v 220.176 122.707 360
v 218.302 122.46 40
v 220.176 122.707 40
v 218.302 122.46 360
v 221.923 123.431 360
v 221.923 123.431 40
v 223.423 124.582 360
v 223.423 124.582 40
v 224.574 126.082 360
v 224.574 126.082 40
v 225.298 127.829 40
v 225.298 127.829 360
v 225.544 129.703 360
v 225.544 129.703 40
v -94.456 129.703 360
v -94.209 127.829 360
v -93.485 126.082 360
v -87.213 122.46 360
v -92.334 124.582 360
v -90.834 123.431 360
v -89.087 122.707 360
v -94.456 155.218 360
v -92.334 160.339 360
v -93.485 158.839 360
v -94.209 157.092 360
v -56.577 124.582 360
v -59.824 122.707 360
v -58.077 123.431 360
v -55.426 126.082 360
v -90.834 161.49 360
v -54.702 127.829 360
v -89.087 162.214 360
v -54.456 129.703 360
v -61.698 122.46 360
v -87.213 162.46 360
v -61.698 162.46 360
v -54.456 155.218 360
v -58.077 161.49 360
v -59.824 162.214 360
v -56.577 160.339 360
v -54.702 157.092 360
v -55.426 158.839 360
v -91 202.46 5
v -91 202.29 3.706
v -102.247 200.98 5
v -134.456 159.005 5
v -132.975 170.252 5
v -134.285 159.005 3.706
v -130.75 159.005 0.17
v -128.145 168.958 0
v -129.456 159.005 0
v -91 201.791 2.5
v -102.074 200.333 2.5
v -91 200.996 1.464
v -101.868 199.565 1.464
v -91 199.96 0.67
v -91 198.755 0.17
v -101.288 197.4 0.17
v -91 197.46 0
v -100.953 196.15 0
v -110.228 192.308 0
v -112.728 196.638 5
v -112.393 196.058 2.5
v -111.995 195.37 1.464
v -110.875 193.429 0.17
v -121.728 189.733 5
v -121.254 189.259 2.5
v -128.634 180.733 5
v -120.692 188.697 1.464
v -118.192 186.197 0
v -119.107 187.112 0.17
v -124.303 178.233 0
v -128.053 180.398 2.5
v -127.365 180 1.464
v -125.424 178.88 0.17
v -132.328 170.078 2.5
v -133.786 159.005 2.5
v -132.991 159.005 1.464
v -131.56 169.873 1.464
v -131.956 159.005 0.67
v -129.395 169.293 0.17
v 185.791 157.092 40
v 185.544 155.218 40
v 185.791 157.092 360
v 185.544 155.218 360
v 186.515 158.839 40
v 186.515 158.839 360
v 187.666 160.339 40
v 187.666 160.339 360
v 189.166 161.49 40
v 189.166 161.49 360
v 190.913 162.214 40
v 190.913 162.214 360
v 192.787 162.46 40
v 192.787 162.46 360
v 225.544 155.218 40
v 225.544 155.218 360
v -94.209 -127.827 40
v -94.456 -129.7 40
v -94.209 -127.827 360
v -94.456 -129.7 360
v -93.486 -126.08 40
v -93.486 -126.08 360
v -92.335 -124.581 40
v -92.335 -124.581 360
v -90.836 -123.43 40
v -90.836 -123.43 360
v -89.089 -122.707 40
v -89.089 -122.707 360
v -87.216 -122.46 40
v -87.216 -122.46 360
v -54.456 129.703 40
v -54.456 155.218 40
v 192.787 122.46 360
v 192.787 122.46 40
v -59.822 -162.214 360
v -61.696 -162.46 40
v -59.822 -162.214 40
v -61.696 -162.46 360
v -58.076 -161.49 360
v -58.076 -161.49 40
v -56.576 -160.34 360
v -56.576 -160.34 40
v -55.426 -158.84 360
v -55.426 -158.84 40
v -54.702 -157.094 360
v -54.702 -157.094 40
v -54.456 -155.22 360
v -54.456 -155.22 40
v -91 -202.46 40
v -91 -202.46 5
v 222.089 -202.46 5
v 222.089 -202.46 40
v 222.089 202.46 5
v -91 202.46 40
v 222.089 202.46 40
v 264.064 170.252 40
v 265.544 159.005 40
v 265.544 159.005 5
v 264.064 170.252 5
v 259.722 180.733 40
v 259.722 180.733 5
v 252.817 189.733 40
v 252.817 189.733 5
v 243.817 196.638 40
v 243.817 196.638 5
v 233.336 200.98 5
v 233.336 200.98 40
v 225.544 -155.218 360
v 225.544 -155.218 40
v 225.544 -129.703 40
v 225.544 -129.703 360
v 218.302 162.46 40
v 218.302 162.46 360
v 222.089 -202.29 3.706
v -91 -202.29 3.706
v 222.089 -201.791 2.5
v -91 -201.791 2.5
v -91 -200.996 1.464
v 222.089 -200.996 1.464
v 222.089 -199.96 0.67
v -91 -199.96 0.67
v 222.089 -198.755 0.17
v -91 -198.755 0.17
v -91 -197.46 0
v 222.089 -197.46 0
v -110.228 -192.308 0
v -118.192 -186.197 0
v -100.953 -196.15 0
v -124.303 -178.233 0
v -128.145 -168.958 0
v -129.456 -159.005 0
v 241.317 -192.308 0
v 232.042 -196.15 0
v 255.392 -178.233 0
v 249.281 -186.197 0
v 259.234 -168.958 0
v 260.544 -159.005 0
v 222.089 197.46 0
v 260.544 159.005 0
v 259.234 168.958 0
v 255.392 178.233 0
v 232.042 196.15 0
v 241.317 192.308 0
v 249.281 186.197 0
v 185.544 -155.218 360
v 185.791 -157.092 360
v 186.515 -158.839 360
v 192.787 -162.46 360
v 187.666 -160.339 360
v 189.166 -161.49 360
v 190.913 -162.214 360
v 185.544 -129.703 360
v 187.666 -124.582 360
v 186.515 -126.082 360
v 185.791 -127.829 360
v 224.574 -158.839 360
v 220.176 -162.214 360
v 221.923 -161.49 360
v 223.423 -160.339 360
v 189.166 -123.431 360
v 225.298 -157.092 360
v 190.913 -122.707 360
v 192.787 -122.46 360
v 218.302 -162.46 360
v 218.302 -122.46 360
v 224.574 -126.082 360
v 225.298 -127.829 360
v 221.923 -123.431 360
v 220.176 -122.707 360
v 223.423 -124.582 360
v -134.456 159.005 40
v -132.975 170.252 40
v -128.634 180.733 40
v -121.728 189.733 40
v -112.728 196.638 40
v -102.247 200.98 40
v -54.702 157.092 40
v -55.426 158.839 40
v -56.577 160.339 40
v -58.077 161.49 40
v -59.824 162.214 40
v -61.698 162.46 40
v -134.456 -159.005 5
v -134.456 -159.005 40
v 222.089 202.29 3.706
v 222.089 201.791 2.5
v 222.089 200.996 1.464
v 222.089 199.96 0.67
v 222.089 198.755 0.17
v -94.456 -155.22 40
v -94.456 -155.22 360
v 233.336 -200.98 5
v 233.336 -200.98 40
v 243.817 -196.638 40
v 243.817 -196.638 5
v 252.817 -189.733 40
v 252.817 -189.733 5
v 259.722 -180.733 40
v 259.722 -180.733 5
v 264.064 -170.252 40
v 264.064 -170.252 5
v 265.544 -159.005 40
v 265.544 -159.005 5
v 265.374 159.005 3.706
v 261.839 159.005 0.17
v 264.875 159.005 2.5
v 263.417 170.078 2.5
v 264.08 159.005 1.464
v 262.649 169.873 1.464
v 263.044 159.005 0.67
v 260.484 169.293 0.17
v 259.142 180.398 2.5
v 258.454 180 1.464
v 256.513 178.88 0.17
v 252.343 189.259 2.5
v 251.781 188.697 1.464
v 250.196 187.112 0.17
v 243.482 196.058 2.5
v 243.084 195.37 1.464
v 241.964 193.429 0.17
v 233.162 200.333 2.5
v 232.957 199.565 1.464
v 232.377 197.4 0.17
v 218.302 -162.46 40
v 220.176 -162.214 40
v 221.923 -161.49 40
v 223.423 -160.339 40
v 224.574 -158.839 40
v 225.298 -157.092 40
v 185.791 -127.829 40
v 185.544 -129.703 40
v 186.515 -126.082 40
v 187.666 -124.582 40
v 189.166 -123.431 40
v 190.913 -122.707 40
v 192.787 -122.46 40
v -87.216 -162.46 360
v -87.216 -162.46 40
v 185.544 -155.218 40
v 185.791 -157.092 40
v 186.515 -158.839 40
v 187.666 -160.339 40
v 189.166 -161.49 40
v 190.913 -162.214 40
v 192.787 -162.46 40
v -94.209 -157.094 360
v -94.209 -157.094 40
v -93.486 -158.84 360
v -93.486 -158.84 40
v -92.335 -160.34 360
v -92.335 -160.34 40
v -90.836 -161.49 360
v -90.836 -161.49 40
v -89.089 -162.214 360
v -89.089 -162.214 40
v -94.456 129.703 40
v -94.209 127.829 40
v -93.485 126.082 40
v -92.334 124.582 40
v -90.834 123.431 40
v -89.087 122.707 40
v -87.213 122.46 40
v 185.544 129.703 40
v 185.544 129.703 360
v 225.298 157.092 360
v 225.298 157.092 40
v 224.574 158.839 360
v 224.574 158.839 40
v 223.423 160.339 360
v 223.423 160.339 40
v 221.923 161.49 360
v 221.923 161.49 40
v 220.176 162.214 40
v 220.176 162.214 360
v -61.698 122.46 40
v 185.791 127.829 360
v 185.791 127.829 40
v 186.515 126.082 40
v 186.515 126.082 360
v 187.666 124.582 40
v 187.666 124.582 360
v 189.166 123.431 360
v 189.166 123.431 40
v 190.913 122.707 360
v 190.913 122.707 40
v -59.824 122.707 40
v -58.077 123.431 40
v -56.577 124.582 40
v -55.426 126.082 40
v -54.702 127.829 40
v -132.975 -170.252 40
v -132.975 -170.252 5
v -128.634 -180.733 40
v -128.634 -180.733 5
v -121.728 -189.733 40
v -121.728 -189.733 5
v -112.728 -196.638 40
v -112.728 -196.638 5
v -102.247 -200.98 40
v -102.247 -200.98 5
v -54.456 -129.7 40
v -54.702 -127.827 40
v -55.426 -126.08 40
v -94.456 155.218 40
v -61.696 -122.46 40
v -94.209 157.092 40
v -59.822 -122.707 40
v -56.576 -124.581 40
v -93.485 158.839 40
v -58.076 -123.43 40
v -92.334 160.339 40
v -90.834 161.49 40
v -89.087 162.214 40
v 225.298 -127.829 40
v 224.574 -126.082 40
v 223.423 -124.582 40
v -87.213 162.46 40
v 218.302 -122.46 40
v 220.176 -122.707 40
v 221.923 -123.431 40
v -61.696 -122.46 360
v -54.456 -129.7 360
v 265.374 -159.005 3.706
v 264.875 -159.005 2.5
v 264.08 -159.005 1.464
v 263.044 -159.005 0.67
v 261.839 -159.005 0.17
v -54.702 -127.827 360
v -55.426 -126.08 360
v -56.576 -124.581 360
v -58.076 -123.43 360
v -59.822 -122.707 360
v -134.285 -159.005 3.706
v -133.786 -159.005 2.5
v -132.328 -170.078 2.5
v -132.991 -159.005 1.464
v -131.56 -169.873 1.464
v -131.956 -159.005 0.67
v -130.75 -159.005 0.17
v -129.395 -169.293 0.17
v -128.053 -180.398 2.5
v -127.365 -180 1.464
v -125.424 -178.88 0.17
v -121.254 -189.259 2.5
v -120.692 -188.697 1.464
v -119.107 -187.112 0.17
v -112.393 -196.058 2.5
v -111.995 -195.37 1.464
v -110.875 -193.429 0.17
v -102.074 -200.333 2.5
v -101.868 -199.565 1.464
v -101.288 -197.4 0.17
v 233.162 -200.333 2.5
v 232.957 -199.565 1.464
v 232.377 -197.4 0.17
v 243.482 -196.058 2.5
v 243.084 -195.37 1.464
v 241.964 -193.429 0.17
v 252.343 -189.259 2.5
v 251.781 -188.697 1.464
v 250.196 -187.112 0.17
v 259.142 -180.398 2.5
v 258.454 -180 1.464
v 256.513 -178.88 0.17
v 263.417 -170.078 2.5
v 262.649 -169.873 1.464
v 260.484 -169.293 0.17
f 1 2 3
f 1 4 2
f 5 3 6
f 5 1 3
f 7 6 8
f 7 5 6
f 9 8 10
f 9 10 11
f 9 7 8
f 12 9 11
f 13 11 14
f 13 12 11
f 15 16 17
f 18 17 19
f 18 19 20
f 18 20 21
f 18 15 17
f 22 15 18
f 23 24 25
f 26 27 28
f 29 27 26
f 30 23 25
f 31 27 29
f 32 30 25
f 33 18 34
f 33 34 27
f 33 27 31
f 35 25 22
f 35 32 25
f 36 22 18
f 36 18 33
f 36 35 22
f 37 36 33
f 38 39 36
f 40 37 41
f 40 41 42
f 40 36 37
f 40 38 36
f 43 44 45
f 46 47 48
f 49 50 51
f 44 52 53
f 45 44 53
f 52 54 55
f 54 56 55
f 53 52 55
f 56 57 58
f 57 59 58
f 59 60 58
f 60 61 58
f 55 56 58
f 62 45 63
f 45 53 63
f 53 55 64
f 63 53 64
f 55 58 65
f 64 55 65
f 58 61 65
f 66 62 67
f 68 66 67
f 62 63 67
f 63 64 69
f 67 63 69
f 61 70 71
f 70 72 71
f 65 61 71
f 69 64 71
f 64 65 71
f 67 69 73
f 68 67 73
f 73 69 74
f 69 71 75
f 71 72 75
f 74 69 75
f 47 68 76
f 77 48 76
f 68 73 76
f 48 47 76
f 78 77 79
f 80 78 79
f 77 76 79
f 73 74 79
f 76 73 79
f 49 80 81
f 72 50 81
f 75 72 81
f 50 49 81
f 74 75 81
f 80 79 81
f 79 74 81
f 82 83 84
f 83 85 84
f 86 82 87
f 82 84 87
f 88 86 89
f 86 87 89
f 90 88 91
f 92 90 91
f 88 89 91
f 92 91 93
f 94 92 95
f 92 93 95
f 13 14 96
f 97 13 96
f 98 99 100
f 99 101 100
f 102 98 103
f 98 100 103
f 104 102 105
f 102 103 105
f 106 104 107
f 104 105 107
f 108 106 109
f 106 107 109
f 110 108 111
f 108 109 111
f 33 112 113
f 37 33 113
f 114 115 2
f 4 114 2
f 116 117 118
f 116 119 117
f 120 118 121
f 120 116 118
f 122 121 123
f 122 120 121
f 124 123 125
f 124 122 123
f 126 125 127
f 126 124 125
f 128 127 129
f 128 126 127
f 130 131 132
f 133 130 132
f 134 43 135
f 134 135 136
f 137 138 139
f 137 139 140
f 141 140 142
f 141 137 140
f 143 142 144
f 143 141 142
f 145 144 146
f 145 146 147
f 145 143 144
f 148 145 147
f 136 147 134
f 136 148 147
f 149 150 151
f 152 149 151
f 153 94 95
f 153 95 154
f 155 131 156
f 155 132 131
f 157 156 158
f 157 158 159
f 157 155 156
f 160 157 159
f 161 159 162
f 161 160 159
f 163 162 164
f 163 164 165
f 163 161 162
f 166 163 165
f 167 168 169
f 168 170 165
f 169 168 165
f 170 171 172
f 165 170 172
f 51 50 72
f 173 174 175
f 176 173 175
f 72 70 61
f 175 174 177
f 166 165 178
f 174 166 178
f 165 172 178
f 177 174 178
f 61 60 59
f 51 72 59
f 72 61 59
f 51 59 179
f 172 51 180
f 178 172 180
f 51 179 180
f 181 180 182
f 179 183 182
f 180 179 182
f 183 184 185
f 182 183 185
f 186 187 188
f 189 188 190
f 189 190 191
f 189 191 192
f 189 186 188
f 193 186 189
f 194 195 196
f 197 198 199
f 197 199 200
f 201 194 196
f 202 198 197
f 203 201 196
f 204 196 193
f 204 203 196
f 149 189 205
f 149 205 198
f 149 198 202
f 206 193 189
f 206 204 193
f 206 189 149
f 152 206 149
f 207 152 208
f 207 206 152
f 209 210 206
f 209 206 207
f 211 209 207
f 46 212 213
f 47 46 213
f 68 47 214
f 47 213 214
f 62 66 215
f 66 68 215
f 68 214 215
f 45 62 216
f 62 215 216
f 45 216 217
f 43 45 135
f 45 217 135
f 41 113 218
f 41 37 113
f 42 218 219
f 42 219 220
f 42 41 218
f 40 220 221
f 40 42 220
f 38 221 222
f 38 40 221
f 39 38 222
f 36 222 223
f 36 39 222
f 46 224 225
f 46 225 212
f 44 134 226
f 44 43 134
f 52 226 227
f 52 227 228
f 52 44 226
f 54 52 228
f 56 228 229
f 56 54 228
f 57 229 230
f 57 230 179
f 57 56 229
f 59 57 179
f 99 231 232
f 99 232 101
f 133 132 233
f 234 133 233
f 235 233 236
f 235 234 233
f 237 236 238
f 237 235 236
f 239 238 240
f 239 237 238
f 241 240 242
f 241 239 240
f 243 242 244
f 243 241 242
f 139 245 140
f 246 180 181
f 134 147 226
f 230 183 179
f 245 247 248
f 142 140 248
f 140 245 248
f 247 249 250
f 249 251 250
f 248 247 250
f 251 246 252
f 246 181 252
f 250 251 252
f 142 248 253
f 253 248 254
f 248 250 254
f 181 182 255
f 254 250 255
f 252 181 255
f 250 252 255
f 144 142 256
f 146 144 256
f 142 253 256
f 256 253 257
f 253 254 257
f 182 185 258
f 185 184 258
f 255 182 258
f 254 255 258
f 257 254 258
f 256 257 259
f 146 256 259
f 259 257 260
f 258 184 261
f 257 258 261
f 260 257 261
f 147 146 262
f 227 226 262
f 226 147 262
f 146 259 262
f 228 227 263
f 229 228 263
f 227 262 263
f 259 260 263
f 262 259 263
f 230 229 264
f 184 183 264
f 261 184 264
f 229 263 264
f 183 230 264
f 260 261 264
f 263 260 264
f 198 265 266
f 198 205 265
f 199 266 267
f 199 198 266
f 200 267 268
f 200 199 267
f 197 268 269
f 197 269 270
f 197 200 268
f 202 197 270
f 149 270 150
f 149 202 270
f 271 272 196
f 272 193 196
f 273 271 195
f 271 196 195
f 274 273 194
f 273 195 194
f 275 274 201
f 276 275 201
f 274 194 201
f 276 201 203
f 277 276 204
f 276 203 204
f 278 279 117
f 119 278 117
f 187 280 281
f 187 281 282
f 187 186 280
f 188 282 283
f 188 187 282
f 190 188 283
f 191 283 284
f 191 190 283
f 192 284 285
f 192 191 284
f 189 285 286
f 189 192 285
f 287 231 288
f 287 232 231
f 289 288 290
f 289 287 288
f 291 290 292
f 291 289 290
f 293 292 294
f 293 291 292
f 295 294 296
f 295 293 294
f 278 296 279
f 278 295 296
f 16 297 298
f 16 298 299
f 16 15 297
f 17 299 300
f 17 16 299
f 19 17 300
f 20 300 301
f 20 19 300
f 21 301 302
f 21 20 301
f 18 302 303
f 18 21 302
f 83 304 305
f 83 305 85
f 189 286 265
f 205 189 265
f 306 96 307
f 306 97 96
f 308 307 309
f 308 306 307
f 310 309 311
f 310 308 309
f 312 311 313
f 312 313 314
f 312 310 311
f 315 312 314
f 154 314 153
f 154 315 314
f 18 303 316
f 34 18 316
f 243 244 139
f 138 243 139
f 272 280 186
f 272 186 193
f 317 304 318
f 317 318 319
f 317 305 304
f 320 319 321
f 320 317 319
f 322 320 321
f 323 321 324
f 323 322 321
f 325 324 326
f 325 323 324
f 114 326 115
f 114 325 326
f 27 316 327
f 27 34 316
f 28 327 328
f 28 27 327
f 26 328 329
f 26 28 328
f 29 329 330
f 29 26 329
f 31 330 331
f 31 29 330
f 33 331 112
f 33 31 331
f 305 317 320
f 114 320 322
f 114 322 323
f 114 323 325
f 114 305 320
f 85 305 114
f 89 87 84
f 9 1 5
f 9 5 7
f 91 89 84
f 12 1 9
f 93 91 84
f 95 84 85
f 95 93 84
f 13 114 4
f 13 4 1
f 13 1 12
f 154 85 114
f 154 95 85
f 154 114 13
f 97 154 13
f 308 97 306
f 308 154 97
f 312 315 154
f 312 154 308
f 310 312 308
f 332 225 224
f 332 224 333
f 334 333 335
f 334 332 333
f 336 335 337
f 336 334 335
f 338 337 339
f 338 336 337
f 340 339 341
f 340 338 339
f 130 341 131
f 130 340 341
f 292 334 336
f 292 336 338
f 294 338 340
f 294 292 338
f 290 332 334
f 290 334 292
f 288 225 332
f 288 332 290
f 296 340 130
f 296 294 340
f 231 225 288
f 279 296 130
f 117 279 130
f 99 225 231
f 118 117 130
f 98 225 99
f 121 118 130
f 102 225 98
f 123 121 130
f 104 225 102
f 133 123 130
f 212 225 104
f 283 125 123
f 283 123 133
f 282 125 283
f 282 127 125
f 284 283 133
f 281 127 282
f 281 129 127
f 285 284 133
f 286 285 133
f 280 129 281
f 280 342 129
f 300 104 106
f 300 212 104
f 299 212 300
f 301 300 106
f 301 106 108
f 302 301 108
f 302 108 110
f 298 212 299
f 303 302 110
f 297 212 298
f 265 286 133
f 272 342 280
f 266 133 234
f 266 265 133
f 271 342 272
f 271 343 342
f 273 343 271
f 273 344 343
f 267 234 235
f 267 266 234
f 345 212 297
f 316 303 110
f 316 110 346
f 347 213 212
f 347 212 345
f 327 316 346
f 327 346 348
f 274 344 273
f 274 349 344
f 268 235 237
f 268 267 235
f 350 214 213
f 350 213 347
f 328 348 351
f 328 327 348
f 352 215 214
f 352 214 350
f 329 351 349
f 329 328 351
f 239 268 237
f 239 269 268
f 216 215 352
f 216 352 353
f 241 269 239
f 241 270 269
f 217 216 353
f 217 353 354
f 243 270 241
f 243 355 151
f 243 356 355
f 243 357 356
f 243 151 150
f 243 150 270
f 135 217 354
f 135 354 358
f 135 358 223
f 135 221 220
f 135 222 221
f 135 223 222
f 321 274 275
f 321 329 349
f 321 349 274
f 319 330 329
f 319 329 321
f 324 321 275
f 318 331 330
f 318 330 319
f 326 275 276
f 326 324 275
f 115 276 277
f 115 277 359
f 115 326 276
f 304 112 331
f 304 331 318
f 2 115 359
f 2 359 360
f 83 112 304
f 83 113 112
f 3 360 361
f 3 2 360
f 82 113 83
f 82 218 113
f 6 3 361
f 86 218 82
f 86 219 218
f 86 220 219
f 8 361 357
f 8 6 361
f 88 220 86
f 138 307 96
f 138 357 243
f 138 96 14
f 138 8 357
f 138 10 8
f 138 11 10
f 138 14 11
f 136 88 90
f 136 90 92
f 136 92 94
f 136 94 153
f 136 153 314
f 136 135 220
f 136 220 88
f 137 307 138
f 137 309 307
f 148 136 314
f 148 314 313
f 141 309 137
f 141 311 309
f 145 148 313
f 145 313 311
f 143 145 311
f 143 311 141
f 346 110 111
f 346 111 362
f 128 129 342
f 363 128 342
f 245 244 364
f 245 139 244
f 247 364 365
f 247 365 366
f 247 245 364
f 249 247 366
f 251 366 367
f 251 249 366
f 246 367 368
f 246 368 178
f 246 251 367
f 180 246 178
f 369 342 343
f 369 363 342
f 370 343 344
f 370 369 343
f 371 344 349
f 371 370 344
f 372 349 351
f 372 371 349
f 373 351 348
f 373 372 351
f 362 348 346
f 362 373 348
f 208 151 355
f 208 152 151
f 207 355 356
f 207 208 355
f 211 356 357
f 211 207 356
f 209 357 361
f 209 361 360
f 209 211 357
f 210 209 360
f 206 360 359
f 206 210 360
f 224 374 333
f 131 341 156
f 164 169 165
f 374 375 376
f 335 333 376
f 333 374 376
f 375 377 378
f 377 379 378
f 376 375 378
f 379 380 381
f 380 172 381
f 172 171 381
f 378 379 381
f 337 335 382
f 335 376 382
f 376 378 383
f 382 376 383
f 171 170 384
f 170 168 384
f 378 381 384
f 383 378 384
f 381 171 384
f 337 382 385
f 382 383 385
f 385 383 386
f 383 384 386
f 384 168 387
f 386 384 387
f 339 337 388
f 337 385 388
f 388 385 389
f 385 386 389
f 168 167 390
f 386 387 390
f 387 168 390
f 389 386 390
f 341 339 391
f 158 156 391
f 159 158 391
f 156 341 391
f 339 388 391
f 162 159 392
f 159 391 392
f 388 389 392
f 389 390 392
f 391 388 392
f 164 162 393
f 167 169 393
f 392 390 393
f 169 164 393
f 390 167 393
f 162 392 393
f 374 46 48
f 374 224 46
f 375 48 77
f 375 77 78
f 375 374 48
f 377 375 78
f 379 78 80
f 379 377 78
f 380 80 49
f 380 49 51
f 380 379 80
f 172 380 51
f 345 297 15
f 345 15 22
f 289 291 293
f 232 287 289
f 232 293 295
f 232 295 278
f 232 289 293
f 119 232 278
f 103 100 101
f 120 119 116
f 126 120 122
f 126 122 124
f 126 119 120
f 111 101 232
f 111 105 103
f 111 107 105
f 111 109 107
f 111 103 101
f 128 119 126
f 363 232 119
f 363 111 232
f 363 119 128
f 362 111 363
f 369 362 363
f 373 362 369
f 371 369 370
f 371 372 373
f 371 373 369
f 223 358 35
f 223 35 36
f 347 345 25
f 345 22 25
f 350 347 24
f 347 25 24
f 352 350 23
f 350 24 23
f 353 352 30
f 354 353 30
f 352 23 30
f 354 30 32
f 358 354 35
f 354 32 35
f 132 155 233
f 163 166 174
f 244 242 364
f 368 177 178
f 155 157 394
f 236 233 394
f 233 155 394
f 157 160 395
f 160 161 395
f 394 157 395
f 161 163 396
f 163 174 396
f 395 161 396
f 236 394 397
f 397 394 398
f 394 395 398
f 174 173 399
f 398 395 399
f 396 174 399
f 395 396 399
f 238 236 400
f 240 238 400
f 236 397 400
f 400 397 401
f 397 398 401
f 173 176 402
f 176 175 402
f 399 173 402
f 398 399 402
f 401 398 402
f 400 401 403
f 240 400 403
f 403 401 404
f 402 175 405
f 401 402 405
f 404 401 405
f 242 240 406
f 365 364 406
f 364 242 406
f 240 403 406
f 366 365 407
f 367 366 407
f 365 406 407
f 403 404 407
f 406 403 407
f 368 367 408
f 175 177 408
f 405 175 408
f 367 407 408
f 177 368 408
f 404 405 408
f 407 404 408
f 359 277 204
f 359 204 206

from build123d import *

# Parameters (mm, degrees)
F0_W     = 400
F0_H     = 404.9209267448
F1_DEPTH = 40
F2_R     = 43.4558441227
F3_W     = 40
F3_H     = 40
F4_DEPTH = 360
F5_R     = 7.24
F6_W     = 40
F6_H     = 40
F7_DEPTH = 360
F8_R     = 7.2426406871
F9_R     = 5


with BuildPart() as f1:
    # F0 (on Top) → F1 (new body)
    with BuildSketch(Plane.XY):
        with Locations((65.5444227159, 0)):
            Rectangle(F0_W, F0_H)
    extrude(amount=F1_DEPTH)

    # F2
    f2_edges = [f1.edges().sort_by_distance(p)[0] for p in [
        (-134.455577, -202.460463, 20),
        (-134.455577, 202.460463, 20),
        (265.544423, 202.460463, 20),
        (265.544423, -202.460463, 20),
    ]]
    fillet(f2_edges, radius=F2_R)

    # F3 (on Top) → F4 (join)
    with BuildSketch(Plane.XY):
        with Locations((-74.4555772841, -142.4604633724)):
            Rectangle(F3_W, F3_H)
    extrude(amount=F4_DEPTH)

    # F5
    f5_edges = [f1.edges().sort_by_distance(p)[0] for p in [
        (-54.455577, -162.460463, 200),
        (-54.455577, -122.460463, 200),
        (-94.455577, -122.460463, 200),
        (-94.455577, -162.460463, 200),
    ]]
    fillet(f5_edges, radius=F5_R)

    # F6 (on Top) → F7 (join)
    with BuildSketch(Plane.XY):
        with Locations((205.5444227159, -142.4604633724)):
            Rectangle(F6_W, F6_H)
        with Locations((205.5444227159, 142.4604633724)):
            Rectangle(F6_W, F6_H)
        with Locations((-74.4555772841, 142.4604633724)):
            Rectangle(F6_W, F6_H)
    extrude(amount=F7_DEPTH)

    # F8
    f8_edges = [f1.edges().sort_by_distance(p)[0] for p in [
        (-54.455577, 162.460463, 200),
        (-94.455577, 162.460463, 200),
        (-94.455577, 122.460463, 200),
        (-54.455577, 122.460463, 200),
        (225.544423, 122.460463, 200),
        (225.544423, 162.460463, 200),
        (185.544423, 122.460463, 200),
        (185.544423, 162.460463, 200),
        (225.544423, -162.460463, 200),
        (225.544423, -122.460463, 200),
        (185.544423, -162.460463, 200),
        (185.544423, -122.460463, 200),
    ]]
    fillet(f8_edges, radius=F8_R)

    # F9
    f9_edges = [f1.edges().sort_by_distance(p)[0] for p in [
        (265.544423, 0, 0),
        (252.816501, 189.732541, 0),
        (65.544423, 202.460463, 0),
        (-121.727655, 189.732541, 0),
        (-134.455577, 0, 0),
        (-121.727655, -189.732541, 0),
        (65.544423, -202.460463, 0),
        (252.816501, -189.732541, 0),
    ]]
    fillet(f9_edges, radius=F9_R)


solid = f1.part
